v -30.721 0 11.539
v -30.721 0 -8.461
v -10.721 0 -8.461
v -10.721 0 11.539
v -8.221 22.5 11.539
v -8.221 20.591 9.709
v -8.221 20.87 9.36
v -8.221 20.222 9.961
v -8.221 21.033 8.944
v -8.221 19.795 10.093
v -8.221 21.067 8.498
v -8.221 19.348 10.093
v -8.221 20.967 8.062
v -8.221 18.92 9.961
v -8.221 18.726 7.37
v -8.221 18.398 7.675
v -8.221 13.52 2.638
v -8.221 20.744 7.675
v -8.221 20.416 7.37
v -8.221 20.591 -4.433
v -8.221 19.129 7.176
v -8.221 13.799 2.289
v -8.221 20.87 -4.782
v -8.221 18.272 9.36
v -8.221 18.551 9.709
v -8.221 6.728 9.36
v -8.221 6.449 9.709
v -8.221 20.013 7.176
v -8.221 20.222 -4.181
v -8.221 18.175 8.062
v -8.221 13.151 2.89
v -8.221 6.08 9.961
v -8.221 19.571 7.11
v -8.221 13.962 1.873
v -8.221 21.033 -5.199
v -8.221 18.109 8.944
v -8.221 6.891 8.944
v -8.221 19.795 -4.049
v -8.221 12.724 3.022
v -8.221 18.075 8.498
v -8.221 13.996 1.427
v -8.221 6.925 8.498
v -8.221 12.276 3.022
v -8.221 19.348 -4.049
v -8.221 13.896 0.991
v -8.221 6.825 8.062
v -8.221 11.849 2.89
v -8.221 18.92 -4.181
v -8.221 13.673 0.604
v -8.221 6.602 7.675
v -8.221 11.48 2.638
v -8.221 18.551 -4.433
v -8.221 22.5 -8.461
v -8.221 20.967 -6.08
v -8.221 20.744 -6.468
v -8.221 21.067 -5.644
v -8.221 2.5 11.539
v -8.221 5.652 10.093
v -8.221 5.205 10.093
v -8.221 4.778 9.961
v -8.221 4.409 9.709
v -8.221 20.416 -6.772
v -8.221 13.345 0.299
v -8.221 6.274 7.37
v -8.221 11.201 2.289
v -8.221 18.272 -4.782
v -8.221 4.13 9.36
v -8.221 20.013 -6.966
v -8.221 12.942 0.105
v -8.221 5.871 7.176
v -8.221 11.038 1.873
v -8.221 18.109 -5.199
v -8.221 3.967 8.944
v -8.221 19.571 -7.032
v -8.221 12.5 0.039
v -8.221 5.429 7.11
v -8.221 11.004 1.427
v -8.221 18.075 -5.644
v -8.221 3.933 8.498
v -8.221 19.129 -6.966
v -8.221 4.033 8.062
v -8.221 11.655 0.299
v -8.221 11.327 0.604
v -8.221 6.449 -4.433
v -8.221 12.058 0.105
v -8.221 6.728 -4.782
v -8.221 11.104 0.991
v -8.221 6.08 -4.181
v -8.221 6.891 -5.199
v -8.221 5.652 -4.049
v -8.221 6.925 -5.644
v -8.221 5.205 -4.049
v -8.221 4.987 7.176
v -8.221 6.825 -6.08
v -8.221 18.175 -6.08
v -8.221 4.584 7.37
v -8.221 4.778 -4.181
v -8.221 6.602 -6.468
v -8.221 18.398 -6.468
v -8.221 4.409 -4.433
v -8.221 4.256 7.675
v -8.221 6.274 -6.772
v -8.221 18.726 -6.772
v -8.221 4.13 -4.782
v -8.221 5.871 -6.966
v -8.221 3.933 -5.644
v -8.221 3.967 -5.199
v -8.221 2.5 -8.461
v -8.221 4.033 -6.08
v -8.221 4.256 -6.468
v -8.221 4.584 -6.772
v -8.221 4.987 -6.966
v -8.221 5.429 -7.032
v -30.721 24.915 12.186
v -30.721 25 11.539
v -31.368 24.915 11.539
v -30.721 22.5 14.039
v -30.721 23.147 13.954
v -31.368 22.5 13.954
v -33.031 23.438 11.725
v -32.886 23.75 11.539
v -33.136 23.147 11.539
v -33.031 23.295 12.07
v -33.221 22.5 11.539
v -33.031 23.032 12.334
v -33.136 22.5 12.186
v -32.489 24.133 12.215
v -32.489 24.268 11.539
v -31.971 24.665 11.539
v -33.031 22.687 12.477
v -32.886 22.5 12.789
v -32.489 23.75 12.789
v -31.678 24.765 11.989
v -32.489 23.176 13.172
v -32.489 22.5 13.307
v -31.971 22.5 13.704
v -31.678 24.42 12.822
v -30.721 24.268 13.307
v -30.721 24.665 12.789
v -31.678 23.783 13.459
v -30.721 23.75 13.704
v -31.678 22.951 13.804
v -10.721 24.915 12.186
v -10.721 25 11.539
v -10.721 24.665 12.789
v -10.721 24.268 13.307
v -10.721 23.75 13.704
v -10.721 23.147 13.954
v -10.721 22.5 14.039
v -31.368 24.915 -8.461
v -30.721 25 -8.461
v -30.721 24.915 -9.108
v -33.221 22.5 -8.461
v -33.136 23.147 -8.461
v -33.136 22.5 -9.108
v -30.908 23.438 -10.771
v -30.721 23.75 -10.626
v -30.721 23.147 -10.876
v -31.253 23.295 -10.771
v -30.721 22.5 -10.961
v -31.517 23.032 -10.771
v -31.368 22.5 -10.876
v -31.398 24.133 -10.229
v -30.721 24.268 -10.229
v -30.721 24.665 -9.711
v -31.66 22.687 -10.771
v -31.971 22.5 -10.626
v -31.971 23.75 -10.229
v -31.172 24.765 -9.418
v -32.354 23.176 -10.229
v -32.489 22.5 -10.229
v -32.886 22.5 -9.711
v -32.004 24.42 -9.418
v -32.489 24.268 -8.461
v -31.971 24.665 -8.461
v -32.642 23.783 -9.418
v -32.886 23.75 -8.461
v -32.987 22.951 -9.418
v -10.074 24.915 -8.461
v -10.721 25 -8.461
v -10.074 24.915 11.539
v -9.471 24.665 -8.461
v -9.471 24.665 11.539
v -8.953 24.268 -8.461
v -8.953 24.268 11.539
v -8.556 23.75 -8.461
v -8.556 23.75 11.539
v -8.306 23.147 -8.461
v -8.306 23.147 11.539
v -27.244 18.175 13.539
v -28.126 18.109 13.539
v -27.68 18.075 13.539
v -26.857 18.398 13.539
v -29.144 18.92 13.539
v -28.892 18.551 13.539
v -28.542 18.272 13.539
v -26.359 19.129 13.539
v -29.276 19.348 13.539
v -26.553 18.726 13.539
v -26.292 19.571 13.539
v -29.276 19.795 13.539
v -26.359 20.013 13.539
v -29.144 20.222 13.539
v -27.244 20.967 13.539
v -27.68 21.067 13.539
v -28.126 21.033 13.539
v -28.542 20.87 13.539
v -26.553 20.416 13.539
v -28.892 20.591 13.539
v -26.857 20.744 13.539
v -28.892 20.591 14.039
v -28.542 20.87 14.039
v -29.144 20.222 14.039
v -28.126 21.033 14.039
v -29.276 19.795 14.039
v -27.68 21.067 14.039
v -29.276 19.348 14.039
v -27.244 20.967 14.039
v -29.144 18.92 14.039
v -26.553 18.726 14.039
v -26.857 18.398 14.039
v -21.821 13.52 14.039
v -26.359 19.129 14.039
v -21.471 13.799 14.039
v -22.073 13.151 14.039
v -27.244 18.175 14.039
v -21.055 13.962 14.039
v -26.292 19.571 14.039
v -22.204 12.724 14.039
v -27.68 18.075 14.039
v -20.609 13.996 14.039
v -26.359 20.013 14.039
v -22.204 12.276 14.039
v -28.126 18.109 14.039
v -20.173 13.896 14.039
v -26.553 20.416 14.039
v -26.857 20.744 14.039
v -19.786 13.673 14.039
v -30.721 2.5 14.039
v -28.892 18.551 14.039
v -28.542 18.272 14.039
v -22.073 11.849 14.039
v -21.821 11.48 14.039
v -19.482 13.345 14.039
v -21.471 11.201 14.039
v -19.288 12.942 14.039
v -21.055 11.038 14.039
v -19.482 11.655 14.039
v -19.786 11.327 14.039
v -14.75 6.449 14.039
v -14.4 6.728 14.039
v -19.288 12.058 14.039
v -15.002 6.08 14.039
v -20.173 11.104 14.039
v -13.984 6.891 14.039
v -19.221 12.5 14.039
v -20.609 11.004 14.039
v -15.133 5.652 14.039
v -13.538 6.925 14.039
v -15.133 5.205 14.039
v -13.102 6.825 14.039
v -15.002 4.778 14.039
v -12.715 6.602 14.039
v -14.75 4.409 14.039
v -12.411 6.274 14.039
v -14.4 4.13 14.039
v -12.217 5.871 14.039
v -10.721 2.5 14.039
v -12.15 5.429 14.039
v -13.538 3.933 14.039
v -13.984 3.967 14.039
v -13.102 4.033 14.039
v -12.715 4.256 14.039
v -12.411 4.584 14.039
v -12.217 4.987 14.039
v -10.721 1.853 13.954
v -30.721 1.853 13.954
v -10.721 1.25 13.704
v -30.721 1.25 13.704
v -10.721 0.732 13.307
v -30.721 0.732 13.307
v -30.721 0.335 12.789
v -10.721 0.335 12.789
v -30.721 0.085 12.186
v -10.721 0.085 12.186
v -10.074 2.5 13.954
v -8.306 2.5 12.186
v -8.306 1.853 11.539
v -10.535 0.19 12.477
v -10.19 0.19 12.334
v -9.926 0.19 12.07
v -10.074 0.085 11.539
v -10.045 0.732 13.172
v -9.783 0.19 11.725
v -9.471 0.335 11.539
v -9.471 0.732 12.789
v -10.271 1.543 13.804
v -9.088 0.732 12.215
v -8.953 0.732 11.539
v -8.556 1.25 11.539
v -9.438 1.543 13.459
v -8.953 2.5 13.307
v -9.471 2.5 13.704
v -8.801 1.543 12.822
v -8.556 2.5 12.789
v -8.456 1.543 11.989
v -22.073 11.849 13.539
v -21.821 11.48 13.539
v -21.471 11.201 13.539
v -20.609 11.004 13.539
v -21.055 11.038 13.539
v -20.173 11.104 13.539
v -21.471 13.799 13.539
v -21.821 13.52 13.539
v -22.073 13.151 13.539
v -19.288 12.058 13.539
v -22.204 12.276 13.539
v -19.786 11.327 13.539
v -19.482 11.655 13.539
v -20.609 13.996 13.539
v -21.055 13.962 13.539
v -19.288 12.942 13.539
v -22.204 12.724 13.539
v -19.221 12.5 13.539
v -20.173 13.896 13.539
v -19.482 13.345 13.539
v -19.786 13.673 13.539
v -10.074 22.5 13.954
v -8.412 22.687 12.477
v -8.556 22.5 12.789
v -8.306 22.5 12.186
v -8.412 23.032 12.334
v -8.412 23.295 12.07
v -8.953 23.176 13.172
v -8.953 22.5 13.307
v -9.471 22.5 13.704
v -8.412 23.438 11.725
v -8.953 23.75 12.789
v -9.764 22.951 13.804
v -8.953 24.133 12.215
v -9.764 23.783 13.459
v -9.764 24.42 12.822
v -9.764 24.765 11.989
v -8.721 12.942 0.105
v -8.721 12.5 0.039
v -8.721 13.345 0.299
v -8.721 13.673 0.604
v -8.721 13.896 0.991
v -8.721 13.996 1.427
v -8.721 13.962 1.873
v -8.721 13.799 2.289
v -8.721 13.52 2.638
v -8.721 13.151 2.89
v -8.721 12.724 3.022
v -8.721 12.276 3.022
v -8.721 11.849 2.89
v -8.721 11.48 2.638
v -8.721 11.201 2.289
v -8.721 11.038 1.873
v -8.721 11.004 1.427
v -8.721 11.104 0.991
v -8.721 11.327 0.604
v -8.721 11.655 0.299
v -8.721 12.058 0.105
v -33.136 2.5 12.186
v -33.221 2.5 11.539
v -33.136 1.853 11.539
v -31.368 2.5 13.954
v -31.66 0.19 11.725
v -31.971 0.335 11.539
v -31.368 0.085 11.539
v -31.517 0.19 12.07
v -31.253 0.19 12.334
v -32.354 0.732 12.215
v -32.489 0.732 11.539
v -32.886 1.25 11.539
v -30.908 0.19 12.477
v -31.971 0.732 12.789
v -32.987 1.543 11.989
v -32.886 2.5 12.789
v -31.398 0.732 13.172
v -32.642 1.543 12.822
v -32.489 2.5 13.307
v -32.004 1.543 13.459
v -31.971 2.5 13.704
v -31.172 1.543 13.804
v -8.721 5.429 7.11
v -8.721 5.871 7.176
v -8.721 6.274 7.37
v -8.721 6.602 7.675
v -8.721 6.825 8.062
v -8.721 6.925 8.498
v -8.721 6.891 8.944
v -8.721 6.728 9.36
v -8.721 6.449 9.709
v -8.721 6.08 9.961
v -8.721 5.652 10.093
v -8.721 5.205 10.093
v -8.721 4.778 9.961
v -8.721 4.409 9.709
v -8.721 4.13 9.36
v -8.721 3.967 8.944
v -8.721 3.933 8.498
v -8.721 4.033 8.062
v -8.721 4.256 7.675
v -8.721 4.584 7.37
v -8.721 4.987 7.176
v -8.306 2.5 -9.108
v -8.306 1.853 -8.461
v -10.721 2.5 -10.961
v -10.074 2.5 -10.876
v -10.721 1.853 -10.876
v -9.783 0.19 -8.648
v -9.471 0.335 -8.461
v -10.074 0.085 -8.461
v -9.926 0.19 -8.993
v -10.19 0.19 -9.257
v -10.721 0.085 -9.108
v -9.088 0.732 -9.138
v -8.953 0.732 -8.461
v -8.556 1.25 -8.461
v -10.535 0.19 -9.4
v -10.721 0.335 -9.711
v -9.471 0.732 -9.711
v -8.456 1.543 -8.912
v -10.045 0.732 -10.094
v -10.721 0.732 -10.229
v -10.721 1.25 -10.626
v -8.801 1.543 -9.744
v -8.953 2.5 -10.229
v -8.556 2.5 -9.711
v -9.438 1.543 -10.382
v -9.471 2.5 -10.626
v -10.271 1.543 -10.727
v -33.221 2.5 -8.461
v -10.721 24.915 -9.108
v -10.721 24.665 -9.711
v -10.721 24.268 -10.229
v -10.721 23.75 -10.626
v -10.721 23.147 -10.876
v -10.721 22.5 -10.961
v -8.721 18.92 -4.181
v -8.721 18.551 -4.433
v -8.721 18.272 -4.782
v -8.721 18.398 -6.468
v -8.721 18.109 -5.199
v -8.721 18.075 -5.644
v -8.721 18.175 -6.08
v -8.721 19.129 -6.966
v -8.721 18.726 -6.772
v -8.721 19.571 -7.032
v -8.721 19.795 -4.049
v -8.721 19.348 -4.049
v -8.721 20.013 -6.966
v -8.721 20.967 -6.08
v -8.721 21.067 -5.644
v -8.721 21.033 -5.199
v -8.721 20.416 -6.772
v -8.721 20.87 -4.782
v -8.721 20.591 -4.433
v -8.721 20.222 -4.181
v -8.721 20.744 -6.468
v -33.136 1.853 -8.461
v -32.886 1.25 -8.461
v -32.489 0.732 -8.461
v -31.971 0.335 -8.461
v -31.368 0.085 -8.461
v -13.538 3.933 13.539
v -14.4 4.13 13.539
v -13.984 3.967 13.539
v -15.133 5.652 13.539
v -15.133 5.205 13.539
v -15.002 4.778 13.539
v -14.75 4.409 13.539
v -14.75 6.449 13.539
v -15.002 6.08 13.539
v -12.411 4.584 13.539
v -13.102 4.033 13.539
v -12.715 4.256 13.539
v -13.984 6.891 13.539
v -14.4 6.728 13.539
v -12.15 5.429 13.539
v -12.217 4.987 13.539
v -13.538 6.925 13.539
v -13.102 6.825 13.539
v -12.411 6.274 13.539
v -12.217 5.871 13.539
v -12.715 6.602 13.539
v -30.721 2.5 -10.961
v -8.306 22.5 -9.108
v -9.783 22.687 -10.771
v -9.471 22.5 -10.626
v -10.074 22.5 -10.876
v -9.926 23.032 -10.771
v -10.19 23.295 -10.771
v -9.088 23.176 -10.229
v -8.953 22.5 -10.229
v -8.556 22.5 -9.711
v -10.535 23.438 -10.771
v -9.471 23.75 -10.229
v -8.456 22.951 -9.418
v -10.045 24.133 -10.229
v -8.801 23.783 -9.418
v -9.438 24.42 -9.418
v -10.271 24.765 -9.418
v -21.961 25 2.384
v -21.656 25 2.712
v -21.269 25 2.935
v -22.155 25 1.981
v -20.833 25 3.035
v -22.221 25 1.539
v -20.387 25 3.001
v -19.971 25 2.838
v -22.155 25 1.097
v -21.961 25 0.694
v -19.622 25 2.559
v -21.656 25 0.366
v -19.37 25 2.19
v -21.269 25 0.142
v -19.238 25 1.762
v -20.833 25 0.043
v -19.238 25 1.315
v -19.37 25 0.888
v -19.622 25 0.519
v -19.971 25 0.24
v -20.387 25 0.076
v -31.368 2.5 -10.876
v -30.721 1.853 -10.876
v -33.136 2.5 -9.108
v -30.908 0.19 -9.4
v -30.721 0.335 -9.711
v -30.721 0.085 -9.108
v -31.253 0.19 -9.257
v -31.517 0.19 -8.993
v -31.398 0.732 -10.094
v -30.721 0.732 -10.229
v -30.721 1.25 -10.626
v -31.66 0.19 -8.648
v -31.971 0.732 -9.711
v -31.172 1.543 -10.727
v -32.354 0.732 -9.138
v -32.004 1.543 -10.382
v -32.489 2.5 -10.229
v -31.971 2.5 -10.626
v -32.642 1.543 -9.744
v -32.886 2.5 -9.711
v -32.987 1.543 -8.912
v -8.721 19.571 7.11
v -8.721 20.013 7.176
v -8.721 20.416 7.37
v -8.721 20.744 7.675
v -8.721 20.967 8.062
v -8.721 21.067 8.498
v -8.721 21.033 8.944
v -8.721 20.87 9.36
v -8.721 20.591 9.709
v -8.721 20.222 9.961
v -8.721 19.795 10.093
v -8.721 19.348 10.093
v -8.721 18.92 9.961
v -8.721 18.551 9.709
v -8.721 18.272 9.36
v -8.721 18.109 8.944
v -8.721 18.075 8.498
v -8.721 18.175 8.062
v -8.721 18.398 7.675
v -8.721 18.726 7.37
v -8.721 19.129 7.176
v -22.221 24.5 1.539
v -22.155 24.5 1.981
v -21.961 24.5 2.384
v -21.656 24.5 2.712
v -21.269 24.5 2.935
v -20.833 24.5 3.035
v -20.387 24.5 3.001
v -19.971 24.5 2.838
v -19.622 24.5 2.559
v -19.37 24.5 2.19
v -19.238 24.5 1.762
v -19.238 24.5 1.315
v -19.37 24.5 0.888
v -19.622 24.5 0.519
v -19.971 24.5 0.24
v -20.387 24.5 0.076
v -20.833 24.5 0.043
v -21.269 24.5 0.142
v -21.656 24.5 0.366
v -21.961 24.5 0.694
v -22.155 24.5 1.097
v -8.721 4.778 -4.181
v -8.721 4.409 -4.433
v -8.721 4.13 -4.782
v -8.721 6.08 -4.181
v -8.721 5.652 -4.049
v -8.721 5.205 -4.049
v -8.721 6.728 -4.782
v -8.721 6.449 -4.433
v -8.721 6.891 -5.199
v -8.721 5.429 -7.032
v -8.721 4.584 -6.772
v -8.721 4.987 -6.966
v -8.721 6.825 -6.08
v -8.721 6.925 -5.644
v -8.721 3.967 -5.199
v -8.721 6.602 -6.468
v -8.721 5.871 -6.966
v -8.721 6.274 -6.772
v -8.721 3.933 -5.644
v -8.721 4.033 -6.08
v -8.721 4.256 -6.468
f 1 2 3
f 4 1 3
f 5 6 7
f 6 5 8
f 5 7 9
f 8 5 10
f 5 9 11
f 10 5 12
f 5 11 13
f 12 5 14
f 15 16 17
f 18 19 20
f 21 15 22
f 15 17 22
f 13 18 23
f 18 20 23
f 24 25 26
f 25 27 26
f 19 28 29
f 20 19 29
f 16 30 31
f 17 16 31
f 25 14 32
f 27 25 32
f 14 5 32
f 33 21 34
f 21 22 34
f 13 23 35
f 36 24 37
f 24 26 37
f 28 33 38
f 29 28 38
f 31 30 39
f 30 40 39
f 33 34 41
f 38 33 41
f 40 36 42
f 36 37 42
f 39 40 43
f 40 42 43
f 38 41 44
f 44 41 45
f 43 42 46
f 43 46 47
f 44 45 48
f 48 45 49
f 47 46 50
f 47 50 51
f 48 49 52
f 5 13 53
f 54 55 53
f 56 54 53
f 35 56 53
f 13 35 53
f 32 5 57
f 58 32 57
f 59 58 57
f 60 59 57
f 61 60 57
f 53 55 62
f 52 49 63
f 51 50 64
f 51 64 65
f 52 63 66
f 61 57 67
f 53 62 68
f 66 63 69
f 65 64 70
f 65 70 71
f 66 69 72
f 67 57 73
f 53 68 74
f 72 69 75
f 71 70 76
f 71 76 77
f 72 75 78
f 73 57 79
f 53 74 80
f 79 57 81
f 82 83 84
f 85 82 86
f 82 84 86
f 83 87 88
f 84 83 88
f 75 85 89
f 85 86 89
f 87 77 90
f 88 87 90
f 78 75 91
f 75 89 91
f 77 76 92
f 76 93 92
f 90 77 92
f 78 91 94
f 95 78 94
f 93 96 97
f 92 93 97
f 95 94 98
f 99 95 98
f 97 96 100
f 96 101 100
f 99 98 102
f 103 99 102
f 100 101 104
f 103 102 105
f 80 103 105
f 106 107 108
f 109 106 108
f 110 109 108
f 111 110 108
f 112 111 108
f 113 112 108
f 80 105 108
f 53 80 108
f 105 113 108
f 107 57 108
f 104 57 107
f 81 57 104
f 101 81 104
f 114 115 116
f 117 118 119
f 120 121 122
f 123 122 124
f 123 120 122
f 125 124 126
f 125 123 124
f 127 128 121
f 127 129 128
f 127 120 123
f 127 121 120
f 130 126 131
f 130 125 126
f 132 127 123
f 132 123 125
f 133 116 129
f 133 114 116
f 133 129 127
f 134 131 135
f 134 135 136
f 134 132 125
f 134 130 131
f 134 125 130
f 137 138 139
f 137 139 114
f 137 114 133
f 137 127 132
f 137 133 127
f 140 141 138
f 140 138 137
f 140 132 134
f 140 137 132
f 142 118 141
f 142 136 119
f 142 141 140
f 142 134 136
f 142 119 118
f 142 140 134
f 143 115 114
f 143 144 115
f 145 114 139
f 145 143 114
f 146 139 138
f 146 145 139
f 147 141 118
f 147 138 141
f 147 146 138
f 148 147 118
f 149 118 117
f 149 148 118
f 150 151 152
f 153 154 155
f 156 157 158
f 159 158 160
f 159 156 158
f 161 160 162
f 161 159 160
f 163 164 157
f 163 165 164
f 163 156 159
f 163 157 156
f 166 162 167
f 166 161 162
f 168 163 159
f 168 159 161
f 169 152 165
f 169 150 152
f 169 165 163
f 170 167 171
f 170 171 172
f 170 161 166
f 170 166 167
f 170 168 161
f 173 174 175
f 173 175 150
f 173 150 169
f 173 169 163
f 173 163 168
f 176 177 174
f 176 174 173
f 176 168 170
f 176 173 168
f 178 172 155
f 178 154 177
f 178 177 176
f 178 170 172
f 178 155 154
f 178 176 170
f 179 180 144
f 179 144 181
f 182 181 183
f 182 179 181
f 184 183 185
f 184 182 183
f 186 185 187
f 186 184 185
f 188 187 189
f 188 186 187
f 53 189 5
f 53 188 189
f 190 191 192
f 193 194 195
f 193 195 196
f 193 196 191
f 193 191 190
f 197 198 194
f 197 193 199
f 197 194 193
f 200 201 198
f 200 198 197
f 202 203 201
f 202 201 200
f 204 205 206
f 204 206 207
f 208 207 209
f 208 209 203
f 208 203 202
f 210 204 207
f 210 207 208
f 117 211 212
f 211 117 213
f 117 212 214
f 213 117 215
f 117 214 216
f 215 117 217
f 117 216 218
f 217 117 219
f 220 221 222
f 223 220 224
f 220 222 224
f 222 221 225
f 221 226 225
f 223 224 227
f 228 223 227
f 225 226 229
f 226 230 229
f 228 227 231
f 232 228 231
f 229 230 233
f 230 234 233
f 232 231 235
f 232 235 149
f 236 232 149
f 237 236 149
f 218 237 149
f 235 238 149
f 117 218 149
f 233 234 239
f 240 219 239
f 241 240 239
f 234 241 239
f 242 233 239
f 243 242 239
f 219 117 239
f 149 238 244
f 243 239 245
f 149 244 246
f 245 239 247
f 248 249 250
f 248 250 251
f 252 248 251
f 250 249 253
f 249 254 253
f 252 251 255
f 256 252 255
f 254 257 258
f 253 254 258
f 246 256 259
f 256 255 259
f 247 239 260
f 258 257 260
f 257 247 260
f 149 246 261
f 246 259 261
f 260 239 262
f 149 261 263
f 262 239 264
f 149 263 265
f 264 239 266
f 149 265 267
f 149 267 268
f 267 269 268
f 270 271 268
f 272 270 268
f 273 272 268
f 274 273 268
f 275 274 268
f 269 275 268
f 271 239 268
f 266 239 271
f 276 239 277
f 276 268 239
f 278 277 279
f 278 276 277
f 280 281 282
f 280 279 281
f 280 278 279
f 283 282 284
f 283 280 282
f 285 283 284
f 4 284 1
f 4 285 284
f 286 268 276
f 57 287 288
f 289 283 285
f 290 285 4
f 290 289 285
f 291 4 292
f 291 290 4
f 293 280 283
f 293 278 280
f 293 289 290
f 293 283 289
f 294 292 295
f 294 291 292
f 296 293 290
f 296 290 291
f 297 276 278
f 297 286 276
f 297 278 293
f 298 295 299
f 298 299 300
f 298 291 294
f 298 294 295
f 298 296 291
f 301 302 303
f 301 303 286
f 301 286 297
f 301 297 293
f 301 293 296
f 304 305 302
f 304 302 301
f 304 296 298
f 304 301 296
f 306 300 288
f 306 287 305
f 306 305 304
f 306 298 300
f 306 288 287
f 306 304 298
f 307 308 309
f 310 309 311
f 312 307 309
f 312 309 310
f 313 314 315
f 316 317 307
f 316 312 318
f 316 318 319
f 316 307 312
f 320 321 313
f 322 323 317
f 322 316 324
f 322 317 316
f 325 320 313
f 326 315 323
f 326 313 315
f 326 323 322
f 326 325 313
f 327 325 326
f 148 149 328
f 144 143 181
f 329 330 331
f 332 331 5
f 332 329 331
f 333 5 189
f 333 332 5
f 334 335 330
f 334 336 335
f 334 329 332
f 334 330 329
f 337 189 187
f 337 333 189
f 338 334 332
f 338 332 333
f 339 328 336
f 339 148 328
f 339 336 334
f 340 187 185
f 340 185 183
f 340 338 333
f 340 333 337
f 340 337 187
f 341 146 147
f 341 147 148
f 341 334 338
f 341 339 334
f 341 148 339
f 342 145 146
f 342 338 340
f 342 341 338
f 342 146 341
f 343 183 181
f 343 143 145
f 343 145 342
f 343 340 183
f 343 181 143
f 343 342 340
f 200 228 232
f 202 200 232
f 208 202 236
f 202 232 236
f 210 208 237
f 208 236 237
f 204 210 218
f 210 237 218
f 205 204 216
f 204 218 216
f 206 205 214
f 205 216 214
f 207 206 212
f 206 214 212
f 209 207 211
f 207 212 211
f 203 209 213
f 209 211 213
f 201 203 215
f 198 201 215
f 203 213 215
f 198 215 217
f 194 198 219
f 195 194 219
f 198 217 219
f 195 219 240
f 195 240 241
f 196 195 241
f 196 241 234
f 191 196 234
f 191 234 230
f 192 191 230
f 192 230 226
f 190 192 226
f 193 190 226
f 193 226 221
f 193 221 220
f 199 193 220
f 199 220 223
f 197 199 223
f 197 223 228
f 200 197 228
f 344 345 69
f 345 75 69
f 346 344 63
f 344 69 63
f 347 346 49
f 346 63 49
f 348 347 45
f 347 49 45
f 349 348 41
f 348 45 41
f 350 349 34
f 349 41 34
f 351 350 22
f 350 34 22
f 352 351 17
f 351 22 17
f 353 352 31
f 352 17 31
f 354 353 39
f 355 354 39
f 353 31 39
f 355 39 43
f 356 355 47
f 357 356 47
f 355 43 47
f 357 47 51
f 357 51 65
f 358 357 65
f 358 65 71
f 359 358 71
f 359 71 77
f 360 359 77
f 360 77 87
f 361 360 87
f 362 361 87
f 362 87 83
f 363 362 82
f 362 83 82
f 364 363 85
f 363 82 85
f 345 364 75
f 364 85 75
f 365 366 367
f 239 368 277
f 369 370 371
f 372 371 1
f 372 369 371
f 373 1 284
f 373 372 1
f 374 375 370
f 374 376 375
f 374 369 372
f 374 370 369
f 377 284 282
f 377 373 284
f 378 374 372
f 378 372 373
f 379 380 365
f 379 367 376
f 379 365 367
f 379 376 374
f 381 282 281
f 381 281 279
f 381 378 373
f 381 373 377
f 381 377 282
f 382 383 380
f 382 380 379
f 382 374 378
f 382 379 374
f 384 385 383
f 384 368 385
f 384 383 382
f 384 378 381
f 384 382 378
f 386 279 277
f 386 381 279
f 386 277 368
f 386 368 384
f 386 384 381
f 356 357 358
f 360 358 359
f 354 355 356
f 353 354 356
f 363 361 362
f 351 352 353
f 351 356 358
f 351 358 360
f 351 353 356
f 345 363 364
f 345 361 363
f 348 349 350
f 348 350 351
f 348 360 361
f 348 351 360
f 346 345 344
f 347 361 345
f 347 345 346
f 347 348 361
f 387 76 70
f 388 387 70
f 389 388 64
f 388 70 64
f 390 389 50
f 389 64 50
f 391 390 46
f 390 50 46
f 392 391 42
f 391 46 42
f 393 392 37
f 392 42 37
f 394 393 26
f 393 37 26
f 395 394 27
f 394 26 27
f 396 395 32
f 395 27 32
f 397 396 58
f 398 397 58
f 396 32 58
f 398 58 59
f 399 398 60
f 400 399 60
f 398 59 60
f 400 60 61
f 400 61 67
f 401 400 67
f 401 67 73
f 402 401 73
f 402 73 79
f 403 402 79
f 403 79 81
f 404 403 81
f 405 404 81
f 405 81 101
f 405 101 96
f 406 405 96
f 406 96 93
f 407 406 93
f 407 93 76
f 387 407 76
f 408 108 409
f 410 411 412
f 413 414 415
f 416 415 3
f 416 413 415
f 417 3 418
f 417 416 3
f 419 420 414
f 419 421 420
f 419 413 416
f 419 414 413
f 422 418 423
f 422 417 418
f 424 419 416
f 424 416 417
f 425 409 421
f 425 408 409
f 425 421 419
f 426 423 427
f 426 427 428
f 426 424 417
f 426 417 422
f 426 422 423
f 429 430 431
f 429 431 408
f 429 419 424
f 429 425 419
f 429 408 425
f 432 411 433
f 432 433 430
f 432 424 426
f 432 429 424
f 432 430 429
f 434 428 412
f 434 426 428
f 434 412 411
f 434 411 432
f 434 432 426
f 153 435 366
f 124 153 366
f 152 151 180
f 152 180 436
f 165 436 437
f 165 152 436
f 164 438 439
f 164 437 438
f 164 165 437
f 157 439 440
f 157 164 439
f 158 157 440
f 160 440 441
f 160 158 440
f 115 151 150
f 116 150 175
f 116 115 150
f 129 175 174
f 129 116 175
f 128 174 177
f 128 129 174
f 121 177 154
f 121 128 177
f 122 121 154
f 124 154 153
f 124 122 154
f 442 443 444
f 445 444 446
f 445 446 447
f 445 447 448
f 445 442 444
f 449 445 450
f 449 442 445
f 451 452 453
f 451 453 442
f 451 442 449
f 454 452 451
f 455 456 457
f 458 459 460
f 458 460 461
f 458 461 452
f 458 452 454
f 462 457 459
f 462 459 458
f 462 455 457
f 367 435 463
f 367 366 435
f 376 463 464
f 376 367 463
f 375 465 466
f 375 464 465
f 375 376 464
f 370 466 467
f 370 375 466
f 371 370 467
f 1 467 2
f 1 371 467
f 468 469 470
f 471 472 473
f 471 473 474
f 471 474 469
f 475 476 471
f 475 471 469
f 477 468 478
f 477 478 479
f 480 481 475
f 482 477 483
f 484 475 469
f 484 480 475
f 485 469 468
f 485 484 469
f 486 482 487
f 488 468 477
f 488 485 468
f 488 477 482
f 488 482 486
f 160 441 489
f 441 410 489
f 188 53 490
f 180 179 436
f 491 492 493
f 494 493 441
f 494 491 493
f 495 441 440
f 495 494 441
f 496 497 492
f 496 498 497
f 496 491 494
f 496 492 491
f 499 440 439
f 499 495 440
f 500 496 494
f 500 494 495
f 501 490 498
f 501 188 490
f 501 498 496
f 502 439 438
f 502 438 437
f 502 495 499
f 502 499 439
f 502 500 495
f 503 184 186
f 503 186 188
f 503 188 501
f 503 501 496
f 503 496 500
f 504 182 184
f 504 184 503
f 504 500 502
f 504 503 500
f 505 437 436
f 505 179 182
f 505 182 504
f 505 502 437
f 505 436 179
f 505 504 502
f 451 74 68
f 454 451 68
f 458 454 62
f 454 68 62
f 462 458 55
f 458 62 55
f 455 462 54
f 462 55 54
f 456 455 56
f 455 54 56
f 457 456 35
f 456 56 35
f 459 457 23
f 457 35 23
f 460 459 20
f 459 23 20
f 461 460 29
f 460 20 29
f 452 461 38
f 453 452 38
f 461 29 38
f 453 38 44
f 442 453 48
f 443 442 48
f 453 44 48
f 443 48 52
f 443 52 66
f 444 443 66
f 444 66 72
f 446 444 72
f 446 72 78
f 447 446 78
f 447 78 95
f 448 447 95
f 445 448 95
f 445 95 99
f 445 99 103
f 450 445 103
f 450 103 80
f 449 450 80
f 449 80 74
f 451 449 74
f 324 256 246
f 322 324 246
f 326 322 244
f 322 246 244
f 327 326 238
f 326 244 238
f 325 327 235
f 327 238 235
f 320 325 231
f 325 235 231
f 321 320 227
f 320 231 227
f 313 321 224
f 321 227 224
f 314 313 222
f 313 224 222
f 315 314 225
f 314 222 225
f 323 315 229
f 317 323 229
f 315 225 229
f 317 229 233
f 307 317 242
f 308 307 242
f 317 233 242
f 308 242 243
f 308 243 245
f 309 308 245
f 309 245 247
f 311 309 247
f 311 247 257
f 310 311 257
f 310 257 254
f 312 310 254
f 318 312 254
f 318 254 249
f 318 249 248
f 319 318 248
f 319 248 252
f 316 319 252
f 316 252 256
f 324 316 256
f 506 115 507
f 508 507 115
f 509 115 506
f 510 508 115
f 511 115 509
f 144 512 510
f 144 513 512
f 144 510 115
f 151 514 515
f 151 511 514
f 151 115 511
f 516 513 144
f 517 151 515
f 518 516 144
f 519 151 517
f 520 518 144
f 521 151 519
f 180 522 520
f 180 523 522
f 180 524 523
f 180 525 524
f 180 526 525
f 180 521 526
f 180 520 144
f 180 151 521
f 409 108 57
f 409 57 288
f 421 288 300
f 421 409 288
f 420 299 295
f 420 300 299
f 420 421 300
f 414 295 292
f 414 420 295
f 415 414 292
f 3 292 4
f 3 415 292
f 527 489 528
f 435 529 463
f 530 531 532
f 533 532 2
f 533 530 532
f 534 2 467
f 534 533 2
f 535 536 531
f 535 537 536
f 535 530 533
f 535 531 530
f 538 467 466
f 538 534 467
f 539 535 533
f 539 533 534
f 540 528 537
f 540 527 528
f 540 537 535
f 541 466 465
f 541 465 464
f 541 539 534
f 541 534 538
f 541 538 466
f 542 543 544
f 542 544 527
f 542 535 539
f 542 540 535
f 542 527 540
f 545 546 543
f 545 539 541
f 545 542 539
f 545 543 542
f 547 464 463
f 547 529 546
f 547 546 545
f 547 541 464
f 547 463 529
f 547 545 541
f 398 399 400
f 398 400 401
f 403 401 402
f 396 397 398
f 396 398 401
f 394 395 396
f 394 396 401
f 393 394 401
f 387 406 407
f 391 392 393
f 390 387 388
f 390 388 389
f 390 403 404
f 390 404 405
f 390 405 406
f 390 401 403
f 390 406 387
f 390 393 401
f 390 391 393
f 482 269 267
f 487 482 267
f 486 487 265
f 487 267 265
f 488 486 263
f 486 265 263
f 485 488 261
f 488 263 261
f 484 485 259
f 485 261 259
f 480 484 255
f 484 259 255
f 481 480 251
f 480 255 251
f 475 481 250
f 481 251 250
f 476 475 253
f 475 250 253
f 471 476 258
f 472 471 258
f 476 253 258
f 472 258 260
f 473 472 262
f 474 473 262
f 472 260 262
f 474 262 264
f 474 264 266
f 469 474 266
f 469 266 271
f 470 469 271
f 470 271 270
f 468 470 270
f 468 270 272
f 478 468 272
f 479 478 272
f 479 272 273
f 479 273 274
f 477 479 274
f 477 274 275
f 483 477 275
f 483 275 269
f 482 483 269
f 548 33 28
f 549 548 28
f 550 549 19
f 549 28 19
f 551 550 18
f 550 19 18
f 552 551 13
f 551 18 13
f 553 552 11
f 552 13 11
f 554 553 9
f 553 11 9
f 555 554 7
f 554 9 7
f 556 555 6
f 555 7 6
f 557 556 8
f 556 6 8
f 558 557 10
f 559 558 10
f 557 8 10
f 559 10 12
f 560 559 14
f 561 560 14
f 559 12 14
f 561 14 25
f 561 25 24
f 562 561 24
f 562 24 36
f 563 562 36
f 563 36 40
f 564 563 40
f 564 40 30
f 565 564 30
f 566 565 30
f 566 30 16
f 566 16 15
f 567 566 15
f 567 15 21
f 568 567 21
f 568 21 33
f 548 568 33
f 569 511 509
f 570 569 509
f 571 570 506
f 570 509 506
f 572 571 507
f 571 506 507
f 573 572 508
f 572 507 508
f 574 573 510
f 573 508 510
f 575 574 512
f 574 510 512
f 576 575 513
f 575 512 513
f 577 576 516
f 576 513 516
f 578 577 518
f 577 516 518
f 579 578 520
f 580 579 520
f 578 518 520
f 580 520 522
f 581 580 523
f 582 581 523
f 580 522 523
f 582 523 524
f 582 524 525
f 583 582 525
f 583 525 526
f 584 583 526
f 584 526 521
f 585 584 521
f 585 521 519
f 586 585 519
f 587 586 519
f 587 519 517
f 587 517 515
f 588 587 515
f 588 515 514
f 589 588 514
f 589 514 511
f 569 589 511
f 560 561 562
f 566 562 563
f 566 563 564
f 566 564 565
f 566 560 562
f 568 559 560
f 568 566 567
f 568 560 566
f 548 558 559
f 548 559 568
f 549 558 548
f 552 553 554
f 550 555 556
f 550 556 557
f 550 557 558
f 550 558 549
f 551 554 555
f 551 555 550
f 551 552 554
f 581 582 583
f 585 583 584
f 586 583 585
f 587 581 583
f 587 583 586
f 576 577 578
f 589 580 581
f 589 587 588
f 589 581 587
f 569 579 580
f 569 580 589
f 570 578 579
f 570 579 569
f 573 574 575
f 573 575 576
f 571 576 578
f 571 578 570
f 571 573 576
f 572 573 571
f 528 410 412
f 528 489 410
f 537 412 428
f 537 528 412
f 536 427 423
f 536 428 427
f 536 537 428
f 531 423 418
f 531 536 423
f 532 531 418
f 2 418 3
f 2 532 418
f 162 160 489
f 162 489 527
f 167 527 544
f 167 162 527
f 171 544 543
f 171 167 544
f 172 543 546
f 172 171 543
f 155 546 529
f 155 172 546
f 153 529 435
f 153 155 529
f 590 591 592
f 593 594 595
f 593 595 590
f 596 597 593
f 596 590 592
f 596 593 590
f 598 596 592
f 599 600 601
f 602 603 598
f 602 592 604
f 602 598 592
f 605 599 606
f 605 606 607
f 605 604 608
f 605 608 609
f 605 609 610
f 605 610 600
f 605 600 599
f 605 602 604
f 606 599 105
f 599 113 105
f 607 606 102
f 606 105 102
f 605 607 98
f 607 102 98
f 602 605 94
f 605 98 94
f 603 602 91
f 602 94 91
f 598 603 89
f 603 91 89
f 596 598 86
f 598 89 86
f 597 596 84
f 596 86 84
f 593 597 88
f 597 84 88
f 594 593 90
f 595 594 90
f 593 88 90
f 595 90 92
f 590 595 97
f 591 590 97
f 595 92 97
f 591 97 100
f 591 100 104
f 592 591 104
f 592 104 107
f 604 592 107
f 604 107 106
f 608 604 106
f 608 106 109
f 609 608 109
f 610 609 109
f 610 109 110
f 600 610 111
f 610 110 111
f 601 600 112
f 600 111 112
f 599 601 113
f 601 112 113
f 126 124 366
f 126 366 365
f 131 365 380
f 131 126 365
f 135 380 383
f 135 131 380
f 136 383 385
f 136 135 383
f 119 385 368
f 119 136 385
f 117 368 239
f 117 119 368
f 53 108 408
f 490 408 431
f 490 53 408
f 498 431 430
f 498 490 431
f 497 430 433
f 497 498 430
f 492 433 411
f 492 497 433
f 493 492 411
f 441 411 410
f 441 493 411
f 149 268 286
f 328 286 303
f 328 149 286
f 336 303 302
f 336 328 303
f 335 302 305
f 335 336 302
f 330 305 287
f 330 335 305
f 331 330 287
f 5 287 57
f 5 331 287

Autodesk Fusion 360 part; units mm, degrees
sketch "Esquisse4" plane through (0, 0, 0) normal (0, 1, 0) x (1, 0, 0)
  line L0 (-8.2212, 10.9612) -> (-33.2212, 10.9612)
  line L1 (-33.2212, 10.9612) -> (-33.2212, -14.0388)
  line L2 (-33.2212, -14.0388) -> (-8.2212, -14.0388)
  line L3 (-8.2212, -14.0388) -> (-8.2212, 10.9612)
  dimension "d13" = 25
  dimension "d14" = 25
extrude "Extrusion4" add sketch "Esquisse4" along normal blind 25
sketch "Esquisse5" plane through (0, 25, 0) normal (0, 1, 0) x (-1, 0, 0)
  line L0 (8.2212, 14.0388) -> (8.2212, -10.9612)
  line L1 (8.2212, -10.9612) -> (33.2212, -10.9612)
  line L2 (33.2212, -10.9612) -> (33.2212, 14.0388)
  line L3 (33.2212, 14.0388) -> (8.2212, 14.0388)
  circle A0 centre (20.7212, 1.5388) radius 1.5
  line L4 (33.2212, -10.9612) -> (8.2212, 14.0388) construction
  dimension "d19" = 3
extrude "Extrusion5" cut sketch "Esquisse5" against normal blind 0.5 contours A0
sketch "Esquisse7" plane through (0, 0, 14.0388) normal (0, 0, 1) x (1, 0, 0)
  line L0 (-33.2212, 0) -> (-8.2212, 0)
  line L1 (-8.2212, 0) -> (-8.2212, 25)
  line L2 (-8.2212, 25) -> (-33.2212, 25)
  line L3 (-33.2212, 25) -> (-33.2212, 0)
  line L4 (-33.2212, 25) -> (-8.2212, 0) construction
  line L5 (-33.2212, 0) -> (-8.2212, 25) construction
  circle A0 centre (-20.7212, 12.5) radius 1.5
  circle A1 centre (-27.7923, 19.5711) radius 1.5
  circle A2 centre (-13.6501, 5.4289) radius 1.5
  dimension "d20" = 3
  dimension "d21" = 10
extrude "Extrusion6" cut sketch "Esquisse7" against normal blind 0.5 contours A0 | A1 | A2
sketch "Esquisse8" plane through (-8.2212, 0, 0) normal (1, 0, 0) x (0, 0, -1)
  line L0 (-14.0388, 0) -> (10.9612, 0)
  line L1 (10.9612, 0) -> (10.9612, 25)
  line L2 (10.9612, 25) -> (-14.0388, 25)
  line L3 (-14.0388, 25) -> (-14.0388, 0)
  line L4 (-14.0388, 25) -> (10.9612, 0) construction
  circle A0 centre (-1.5388, 12.5) radius 1.5
  line L5 (-14.0388, 0) -> (10.9612, 25) construction
  circle A1 centre (-8.6098, 19.5711) radius 1.5
  circle A2 centre (-8.6098, 5.4289) radius 1.5
  circle A3 centre (5.5323, 5.4289) radius 1.5
  circle A4 centre (5.5323, 19.5711) radius 1.5
  dimension "d24" = 3
  dimension "d25" = 3
  dimension "d27" = 360
  dimension "d28" = 10
extrude "Extrusion7" cut sketch "Esquisse8" against normal blind 0.5 contours A0 | A1 | A2 | A3 | A4
fillet "Congé2" radius 2.5 12 edges at (-20.7212, 25, 14.0388) (-8.2212, 25, 1.5388) (-8.2212, 12.5, 14.0388) (-33.2212, 12.5, 14.0388) (-33.2212, 25, 1.5388) (-33.2212, 12.5, -10.9612) (-33.2212, 0, 1.5388) (-20.7212, 25, -10.9612) (-8.2212, 12.5, -10.9612) (-20.7212, 0, -10.9612) (-8.2212, 0, 1.5388) (-20.7212, 0, 14.0388)
sketch "Esquisse9" plane through (0, 0, 0) normal (1, 0, 0) x (0, 0, -1)
  circle A0 centre (-30.7056, 27.1014) radius 10
  dimension "d33" = 20
equation "d14 = d13"
equation "d15 = d13"
